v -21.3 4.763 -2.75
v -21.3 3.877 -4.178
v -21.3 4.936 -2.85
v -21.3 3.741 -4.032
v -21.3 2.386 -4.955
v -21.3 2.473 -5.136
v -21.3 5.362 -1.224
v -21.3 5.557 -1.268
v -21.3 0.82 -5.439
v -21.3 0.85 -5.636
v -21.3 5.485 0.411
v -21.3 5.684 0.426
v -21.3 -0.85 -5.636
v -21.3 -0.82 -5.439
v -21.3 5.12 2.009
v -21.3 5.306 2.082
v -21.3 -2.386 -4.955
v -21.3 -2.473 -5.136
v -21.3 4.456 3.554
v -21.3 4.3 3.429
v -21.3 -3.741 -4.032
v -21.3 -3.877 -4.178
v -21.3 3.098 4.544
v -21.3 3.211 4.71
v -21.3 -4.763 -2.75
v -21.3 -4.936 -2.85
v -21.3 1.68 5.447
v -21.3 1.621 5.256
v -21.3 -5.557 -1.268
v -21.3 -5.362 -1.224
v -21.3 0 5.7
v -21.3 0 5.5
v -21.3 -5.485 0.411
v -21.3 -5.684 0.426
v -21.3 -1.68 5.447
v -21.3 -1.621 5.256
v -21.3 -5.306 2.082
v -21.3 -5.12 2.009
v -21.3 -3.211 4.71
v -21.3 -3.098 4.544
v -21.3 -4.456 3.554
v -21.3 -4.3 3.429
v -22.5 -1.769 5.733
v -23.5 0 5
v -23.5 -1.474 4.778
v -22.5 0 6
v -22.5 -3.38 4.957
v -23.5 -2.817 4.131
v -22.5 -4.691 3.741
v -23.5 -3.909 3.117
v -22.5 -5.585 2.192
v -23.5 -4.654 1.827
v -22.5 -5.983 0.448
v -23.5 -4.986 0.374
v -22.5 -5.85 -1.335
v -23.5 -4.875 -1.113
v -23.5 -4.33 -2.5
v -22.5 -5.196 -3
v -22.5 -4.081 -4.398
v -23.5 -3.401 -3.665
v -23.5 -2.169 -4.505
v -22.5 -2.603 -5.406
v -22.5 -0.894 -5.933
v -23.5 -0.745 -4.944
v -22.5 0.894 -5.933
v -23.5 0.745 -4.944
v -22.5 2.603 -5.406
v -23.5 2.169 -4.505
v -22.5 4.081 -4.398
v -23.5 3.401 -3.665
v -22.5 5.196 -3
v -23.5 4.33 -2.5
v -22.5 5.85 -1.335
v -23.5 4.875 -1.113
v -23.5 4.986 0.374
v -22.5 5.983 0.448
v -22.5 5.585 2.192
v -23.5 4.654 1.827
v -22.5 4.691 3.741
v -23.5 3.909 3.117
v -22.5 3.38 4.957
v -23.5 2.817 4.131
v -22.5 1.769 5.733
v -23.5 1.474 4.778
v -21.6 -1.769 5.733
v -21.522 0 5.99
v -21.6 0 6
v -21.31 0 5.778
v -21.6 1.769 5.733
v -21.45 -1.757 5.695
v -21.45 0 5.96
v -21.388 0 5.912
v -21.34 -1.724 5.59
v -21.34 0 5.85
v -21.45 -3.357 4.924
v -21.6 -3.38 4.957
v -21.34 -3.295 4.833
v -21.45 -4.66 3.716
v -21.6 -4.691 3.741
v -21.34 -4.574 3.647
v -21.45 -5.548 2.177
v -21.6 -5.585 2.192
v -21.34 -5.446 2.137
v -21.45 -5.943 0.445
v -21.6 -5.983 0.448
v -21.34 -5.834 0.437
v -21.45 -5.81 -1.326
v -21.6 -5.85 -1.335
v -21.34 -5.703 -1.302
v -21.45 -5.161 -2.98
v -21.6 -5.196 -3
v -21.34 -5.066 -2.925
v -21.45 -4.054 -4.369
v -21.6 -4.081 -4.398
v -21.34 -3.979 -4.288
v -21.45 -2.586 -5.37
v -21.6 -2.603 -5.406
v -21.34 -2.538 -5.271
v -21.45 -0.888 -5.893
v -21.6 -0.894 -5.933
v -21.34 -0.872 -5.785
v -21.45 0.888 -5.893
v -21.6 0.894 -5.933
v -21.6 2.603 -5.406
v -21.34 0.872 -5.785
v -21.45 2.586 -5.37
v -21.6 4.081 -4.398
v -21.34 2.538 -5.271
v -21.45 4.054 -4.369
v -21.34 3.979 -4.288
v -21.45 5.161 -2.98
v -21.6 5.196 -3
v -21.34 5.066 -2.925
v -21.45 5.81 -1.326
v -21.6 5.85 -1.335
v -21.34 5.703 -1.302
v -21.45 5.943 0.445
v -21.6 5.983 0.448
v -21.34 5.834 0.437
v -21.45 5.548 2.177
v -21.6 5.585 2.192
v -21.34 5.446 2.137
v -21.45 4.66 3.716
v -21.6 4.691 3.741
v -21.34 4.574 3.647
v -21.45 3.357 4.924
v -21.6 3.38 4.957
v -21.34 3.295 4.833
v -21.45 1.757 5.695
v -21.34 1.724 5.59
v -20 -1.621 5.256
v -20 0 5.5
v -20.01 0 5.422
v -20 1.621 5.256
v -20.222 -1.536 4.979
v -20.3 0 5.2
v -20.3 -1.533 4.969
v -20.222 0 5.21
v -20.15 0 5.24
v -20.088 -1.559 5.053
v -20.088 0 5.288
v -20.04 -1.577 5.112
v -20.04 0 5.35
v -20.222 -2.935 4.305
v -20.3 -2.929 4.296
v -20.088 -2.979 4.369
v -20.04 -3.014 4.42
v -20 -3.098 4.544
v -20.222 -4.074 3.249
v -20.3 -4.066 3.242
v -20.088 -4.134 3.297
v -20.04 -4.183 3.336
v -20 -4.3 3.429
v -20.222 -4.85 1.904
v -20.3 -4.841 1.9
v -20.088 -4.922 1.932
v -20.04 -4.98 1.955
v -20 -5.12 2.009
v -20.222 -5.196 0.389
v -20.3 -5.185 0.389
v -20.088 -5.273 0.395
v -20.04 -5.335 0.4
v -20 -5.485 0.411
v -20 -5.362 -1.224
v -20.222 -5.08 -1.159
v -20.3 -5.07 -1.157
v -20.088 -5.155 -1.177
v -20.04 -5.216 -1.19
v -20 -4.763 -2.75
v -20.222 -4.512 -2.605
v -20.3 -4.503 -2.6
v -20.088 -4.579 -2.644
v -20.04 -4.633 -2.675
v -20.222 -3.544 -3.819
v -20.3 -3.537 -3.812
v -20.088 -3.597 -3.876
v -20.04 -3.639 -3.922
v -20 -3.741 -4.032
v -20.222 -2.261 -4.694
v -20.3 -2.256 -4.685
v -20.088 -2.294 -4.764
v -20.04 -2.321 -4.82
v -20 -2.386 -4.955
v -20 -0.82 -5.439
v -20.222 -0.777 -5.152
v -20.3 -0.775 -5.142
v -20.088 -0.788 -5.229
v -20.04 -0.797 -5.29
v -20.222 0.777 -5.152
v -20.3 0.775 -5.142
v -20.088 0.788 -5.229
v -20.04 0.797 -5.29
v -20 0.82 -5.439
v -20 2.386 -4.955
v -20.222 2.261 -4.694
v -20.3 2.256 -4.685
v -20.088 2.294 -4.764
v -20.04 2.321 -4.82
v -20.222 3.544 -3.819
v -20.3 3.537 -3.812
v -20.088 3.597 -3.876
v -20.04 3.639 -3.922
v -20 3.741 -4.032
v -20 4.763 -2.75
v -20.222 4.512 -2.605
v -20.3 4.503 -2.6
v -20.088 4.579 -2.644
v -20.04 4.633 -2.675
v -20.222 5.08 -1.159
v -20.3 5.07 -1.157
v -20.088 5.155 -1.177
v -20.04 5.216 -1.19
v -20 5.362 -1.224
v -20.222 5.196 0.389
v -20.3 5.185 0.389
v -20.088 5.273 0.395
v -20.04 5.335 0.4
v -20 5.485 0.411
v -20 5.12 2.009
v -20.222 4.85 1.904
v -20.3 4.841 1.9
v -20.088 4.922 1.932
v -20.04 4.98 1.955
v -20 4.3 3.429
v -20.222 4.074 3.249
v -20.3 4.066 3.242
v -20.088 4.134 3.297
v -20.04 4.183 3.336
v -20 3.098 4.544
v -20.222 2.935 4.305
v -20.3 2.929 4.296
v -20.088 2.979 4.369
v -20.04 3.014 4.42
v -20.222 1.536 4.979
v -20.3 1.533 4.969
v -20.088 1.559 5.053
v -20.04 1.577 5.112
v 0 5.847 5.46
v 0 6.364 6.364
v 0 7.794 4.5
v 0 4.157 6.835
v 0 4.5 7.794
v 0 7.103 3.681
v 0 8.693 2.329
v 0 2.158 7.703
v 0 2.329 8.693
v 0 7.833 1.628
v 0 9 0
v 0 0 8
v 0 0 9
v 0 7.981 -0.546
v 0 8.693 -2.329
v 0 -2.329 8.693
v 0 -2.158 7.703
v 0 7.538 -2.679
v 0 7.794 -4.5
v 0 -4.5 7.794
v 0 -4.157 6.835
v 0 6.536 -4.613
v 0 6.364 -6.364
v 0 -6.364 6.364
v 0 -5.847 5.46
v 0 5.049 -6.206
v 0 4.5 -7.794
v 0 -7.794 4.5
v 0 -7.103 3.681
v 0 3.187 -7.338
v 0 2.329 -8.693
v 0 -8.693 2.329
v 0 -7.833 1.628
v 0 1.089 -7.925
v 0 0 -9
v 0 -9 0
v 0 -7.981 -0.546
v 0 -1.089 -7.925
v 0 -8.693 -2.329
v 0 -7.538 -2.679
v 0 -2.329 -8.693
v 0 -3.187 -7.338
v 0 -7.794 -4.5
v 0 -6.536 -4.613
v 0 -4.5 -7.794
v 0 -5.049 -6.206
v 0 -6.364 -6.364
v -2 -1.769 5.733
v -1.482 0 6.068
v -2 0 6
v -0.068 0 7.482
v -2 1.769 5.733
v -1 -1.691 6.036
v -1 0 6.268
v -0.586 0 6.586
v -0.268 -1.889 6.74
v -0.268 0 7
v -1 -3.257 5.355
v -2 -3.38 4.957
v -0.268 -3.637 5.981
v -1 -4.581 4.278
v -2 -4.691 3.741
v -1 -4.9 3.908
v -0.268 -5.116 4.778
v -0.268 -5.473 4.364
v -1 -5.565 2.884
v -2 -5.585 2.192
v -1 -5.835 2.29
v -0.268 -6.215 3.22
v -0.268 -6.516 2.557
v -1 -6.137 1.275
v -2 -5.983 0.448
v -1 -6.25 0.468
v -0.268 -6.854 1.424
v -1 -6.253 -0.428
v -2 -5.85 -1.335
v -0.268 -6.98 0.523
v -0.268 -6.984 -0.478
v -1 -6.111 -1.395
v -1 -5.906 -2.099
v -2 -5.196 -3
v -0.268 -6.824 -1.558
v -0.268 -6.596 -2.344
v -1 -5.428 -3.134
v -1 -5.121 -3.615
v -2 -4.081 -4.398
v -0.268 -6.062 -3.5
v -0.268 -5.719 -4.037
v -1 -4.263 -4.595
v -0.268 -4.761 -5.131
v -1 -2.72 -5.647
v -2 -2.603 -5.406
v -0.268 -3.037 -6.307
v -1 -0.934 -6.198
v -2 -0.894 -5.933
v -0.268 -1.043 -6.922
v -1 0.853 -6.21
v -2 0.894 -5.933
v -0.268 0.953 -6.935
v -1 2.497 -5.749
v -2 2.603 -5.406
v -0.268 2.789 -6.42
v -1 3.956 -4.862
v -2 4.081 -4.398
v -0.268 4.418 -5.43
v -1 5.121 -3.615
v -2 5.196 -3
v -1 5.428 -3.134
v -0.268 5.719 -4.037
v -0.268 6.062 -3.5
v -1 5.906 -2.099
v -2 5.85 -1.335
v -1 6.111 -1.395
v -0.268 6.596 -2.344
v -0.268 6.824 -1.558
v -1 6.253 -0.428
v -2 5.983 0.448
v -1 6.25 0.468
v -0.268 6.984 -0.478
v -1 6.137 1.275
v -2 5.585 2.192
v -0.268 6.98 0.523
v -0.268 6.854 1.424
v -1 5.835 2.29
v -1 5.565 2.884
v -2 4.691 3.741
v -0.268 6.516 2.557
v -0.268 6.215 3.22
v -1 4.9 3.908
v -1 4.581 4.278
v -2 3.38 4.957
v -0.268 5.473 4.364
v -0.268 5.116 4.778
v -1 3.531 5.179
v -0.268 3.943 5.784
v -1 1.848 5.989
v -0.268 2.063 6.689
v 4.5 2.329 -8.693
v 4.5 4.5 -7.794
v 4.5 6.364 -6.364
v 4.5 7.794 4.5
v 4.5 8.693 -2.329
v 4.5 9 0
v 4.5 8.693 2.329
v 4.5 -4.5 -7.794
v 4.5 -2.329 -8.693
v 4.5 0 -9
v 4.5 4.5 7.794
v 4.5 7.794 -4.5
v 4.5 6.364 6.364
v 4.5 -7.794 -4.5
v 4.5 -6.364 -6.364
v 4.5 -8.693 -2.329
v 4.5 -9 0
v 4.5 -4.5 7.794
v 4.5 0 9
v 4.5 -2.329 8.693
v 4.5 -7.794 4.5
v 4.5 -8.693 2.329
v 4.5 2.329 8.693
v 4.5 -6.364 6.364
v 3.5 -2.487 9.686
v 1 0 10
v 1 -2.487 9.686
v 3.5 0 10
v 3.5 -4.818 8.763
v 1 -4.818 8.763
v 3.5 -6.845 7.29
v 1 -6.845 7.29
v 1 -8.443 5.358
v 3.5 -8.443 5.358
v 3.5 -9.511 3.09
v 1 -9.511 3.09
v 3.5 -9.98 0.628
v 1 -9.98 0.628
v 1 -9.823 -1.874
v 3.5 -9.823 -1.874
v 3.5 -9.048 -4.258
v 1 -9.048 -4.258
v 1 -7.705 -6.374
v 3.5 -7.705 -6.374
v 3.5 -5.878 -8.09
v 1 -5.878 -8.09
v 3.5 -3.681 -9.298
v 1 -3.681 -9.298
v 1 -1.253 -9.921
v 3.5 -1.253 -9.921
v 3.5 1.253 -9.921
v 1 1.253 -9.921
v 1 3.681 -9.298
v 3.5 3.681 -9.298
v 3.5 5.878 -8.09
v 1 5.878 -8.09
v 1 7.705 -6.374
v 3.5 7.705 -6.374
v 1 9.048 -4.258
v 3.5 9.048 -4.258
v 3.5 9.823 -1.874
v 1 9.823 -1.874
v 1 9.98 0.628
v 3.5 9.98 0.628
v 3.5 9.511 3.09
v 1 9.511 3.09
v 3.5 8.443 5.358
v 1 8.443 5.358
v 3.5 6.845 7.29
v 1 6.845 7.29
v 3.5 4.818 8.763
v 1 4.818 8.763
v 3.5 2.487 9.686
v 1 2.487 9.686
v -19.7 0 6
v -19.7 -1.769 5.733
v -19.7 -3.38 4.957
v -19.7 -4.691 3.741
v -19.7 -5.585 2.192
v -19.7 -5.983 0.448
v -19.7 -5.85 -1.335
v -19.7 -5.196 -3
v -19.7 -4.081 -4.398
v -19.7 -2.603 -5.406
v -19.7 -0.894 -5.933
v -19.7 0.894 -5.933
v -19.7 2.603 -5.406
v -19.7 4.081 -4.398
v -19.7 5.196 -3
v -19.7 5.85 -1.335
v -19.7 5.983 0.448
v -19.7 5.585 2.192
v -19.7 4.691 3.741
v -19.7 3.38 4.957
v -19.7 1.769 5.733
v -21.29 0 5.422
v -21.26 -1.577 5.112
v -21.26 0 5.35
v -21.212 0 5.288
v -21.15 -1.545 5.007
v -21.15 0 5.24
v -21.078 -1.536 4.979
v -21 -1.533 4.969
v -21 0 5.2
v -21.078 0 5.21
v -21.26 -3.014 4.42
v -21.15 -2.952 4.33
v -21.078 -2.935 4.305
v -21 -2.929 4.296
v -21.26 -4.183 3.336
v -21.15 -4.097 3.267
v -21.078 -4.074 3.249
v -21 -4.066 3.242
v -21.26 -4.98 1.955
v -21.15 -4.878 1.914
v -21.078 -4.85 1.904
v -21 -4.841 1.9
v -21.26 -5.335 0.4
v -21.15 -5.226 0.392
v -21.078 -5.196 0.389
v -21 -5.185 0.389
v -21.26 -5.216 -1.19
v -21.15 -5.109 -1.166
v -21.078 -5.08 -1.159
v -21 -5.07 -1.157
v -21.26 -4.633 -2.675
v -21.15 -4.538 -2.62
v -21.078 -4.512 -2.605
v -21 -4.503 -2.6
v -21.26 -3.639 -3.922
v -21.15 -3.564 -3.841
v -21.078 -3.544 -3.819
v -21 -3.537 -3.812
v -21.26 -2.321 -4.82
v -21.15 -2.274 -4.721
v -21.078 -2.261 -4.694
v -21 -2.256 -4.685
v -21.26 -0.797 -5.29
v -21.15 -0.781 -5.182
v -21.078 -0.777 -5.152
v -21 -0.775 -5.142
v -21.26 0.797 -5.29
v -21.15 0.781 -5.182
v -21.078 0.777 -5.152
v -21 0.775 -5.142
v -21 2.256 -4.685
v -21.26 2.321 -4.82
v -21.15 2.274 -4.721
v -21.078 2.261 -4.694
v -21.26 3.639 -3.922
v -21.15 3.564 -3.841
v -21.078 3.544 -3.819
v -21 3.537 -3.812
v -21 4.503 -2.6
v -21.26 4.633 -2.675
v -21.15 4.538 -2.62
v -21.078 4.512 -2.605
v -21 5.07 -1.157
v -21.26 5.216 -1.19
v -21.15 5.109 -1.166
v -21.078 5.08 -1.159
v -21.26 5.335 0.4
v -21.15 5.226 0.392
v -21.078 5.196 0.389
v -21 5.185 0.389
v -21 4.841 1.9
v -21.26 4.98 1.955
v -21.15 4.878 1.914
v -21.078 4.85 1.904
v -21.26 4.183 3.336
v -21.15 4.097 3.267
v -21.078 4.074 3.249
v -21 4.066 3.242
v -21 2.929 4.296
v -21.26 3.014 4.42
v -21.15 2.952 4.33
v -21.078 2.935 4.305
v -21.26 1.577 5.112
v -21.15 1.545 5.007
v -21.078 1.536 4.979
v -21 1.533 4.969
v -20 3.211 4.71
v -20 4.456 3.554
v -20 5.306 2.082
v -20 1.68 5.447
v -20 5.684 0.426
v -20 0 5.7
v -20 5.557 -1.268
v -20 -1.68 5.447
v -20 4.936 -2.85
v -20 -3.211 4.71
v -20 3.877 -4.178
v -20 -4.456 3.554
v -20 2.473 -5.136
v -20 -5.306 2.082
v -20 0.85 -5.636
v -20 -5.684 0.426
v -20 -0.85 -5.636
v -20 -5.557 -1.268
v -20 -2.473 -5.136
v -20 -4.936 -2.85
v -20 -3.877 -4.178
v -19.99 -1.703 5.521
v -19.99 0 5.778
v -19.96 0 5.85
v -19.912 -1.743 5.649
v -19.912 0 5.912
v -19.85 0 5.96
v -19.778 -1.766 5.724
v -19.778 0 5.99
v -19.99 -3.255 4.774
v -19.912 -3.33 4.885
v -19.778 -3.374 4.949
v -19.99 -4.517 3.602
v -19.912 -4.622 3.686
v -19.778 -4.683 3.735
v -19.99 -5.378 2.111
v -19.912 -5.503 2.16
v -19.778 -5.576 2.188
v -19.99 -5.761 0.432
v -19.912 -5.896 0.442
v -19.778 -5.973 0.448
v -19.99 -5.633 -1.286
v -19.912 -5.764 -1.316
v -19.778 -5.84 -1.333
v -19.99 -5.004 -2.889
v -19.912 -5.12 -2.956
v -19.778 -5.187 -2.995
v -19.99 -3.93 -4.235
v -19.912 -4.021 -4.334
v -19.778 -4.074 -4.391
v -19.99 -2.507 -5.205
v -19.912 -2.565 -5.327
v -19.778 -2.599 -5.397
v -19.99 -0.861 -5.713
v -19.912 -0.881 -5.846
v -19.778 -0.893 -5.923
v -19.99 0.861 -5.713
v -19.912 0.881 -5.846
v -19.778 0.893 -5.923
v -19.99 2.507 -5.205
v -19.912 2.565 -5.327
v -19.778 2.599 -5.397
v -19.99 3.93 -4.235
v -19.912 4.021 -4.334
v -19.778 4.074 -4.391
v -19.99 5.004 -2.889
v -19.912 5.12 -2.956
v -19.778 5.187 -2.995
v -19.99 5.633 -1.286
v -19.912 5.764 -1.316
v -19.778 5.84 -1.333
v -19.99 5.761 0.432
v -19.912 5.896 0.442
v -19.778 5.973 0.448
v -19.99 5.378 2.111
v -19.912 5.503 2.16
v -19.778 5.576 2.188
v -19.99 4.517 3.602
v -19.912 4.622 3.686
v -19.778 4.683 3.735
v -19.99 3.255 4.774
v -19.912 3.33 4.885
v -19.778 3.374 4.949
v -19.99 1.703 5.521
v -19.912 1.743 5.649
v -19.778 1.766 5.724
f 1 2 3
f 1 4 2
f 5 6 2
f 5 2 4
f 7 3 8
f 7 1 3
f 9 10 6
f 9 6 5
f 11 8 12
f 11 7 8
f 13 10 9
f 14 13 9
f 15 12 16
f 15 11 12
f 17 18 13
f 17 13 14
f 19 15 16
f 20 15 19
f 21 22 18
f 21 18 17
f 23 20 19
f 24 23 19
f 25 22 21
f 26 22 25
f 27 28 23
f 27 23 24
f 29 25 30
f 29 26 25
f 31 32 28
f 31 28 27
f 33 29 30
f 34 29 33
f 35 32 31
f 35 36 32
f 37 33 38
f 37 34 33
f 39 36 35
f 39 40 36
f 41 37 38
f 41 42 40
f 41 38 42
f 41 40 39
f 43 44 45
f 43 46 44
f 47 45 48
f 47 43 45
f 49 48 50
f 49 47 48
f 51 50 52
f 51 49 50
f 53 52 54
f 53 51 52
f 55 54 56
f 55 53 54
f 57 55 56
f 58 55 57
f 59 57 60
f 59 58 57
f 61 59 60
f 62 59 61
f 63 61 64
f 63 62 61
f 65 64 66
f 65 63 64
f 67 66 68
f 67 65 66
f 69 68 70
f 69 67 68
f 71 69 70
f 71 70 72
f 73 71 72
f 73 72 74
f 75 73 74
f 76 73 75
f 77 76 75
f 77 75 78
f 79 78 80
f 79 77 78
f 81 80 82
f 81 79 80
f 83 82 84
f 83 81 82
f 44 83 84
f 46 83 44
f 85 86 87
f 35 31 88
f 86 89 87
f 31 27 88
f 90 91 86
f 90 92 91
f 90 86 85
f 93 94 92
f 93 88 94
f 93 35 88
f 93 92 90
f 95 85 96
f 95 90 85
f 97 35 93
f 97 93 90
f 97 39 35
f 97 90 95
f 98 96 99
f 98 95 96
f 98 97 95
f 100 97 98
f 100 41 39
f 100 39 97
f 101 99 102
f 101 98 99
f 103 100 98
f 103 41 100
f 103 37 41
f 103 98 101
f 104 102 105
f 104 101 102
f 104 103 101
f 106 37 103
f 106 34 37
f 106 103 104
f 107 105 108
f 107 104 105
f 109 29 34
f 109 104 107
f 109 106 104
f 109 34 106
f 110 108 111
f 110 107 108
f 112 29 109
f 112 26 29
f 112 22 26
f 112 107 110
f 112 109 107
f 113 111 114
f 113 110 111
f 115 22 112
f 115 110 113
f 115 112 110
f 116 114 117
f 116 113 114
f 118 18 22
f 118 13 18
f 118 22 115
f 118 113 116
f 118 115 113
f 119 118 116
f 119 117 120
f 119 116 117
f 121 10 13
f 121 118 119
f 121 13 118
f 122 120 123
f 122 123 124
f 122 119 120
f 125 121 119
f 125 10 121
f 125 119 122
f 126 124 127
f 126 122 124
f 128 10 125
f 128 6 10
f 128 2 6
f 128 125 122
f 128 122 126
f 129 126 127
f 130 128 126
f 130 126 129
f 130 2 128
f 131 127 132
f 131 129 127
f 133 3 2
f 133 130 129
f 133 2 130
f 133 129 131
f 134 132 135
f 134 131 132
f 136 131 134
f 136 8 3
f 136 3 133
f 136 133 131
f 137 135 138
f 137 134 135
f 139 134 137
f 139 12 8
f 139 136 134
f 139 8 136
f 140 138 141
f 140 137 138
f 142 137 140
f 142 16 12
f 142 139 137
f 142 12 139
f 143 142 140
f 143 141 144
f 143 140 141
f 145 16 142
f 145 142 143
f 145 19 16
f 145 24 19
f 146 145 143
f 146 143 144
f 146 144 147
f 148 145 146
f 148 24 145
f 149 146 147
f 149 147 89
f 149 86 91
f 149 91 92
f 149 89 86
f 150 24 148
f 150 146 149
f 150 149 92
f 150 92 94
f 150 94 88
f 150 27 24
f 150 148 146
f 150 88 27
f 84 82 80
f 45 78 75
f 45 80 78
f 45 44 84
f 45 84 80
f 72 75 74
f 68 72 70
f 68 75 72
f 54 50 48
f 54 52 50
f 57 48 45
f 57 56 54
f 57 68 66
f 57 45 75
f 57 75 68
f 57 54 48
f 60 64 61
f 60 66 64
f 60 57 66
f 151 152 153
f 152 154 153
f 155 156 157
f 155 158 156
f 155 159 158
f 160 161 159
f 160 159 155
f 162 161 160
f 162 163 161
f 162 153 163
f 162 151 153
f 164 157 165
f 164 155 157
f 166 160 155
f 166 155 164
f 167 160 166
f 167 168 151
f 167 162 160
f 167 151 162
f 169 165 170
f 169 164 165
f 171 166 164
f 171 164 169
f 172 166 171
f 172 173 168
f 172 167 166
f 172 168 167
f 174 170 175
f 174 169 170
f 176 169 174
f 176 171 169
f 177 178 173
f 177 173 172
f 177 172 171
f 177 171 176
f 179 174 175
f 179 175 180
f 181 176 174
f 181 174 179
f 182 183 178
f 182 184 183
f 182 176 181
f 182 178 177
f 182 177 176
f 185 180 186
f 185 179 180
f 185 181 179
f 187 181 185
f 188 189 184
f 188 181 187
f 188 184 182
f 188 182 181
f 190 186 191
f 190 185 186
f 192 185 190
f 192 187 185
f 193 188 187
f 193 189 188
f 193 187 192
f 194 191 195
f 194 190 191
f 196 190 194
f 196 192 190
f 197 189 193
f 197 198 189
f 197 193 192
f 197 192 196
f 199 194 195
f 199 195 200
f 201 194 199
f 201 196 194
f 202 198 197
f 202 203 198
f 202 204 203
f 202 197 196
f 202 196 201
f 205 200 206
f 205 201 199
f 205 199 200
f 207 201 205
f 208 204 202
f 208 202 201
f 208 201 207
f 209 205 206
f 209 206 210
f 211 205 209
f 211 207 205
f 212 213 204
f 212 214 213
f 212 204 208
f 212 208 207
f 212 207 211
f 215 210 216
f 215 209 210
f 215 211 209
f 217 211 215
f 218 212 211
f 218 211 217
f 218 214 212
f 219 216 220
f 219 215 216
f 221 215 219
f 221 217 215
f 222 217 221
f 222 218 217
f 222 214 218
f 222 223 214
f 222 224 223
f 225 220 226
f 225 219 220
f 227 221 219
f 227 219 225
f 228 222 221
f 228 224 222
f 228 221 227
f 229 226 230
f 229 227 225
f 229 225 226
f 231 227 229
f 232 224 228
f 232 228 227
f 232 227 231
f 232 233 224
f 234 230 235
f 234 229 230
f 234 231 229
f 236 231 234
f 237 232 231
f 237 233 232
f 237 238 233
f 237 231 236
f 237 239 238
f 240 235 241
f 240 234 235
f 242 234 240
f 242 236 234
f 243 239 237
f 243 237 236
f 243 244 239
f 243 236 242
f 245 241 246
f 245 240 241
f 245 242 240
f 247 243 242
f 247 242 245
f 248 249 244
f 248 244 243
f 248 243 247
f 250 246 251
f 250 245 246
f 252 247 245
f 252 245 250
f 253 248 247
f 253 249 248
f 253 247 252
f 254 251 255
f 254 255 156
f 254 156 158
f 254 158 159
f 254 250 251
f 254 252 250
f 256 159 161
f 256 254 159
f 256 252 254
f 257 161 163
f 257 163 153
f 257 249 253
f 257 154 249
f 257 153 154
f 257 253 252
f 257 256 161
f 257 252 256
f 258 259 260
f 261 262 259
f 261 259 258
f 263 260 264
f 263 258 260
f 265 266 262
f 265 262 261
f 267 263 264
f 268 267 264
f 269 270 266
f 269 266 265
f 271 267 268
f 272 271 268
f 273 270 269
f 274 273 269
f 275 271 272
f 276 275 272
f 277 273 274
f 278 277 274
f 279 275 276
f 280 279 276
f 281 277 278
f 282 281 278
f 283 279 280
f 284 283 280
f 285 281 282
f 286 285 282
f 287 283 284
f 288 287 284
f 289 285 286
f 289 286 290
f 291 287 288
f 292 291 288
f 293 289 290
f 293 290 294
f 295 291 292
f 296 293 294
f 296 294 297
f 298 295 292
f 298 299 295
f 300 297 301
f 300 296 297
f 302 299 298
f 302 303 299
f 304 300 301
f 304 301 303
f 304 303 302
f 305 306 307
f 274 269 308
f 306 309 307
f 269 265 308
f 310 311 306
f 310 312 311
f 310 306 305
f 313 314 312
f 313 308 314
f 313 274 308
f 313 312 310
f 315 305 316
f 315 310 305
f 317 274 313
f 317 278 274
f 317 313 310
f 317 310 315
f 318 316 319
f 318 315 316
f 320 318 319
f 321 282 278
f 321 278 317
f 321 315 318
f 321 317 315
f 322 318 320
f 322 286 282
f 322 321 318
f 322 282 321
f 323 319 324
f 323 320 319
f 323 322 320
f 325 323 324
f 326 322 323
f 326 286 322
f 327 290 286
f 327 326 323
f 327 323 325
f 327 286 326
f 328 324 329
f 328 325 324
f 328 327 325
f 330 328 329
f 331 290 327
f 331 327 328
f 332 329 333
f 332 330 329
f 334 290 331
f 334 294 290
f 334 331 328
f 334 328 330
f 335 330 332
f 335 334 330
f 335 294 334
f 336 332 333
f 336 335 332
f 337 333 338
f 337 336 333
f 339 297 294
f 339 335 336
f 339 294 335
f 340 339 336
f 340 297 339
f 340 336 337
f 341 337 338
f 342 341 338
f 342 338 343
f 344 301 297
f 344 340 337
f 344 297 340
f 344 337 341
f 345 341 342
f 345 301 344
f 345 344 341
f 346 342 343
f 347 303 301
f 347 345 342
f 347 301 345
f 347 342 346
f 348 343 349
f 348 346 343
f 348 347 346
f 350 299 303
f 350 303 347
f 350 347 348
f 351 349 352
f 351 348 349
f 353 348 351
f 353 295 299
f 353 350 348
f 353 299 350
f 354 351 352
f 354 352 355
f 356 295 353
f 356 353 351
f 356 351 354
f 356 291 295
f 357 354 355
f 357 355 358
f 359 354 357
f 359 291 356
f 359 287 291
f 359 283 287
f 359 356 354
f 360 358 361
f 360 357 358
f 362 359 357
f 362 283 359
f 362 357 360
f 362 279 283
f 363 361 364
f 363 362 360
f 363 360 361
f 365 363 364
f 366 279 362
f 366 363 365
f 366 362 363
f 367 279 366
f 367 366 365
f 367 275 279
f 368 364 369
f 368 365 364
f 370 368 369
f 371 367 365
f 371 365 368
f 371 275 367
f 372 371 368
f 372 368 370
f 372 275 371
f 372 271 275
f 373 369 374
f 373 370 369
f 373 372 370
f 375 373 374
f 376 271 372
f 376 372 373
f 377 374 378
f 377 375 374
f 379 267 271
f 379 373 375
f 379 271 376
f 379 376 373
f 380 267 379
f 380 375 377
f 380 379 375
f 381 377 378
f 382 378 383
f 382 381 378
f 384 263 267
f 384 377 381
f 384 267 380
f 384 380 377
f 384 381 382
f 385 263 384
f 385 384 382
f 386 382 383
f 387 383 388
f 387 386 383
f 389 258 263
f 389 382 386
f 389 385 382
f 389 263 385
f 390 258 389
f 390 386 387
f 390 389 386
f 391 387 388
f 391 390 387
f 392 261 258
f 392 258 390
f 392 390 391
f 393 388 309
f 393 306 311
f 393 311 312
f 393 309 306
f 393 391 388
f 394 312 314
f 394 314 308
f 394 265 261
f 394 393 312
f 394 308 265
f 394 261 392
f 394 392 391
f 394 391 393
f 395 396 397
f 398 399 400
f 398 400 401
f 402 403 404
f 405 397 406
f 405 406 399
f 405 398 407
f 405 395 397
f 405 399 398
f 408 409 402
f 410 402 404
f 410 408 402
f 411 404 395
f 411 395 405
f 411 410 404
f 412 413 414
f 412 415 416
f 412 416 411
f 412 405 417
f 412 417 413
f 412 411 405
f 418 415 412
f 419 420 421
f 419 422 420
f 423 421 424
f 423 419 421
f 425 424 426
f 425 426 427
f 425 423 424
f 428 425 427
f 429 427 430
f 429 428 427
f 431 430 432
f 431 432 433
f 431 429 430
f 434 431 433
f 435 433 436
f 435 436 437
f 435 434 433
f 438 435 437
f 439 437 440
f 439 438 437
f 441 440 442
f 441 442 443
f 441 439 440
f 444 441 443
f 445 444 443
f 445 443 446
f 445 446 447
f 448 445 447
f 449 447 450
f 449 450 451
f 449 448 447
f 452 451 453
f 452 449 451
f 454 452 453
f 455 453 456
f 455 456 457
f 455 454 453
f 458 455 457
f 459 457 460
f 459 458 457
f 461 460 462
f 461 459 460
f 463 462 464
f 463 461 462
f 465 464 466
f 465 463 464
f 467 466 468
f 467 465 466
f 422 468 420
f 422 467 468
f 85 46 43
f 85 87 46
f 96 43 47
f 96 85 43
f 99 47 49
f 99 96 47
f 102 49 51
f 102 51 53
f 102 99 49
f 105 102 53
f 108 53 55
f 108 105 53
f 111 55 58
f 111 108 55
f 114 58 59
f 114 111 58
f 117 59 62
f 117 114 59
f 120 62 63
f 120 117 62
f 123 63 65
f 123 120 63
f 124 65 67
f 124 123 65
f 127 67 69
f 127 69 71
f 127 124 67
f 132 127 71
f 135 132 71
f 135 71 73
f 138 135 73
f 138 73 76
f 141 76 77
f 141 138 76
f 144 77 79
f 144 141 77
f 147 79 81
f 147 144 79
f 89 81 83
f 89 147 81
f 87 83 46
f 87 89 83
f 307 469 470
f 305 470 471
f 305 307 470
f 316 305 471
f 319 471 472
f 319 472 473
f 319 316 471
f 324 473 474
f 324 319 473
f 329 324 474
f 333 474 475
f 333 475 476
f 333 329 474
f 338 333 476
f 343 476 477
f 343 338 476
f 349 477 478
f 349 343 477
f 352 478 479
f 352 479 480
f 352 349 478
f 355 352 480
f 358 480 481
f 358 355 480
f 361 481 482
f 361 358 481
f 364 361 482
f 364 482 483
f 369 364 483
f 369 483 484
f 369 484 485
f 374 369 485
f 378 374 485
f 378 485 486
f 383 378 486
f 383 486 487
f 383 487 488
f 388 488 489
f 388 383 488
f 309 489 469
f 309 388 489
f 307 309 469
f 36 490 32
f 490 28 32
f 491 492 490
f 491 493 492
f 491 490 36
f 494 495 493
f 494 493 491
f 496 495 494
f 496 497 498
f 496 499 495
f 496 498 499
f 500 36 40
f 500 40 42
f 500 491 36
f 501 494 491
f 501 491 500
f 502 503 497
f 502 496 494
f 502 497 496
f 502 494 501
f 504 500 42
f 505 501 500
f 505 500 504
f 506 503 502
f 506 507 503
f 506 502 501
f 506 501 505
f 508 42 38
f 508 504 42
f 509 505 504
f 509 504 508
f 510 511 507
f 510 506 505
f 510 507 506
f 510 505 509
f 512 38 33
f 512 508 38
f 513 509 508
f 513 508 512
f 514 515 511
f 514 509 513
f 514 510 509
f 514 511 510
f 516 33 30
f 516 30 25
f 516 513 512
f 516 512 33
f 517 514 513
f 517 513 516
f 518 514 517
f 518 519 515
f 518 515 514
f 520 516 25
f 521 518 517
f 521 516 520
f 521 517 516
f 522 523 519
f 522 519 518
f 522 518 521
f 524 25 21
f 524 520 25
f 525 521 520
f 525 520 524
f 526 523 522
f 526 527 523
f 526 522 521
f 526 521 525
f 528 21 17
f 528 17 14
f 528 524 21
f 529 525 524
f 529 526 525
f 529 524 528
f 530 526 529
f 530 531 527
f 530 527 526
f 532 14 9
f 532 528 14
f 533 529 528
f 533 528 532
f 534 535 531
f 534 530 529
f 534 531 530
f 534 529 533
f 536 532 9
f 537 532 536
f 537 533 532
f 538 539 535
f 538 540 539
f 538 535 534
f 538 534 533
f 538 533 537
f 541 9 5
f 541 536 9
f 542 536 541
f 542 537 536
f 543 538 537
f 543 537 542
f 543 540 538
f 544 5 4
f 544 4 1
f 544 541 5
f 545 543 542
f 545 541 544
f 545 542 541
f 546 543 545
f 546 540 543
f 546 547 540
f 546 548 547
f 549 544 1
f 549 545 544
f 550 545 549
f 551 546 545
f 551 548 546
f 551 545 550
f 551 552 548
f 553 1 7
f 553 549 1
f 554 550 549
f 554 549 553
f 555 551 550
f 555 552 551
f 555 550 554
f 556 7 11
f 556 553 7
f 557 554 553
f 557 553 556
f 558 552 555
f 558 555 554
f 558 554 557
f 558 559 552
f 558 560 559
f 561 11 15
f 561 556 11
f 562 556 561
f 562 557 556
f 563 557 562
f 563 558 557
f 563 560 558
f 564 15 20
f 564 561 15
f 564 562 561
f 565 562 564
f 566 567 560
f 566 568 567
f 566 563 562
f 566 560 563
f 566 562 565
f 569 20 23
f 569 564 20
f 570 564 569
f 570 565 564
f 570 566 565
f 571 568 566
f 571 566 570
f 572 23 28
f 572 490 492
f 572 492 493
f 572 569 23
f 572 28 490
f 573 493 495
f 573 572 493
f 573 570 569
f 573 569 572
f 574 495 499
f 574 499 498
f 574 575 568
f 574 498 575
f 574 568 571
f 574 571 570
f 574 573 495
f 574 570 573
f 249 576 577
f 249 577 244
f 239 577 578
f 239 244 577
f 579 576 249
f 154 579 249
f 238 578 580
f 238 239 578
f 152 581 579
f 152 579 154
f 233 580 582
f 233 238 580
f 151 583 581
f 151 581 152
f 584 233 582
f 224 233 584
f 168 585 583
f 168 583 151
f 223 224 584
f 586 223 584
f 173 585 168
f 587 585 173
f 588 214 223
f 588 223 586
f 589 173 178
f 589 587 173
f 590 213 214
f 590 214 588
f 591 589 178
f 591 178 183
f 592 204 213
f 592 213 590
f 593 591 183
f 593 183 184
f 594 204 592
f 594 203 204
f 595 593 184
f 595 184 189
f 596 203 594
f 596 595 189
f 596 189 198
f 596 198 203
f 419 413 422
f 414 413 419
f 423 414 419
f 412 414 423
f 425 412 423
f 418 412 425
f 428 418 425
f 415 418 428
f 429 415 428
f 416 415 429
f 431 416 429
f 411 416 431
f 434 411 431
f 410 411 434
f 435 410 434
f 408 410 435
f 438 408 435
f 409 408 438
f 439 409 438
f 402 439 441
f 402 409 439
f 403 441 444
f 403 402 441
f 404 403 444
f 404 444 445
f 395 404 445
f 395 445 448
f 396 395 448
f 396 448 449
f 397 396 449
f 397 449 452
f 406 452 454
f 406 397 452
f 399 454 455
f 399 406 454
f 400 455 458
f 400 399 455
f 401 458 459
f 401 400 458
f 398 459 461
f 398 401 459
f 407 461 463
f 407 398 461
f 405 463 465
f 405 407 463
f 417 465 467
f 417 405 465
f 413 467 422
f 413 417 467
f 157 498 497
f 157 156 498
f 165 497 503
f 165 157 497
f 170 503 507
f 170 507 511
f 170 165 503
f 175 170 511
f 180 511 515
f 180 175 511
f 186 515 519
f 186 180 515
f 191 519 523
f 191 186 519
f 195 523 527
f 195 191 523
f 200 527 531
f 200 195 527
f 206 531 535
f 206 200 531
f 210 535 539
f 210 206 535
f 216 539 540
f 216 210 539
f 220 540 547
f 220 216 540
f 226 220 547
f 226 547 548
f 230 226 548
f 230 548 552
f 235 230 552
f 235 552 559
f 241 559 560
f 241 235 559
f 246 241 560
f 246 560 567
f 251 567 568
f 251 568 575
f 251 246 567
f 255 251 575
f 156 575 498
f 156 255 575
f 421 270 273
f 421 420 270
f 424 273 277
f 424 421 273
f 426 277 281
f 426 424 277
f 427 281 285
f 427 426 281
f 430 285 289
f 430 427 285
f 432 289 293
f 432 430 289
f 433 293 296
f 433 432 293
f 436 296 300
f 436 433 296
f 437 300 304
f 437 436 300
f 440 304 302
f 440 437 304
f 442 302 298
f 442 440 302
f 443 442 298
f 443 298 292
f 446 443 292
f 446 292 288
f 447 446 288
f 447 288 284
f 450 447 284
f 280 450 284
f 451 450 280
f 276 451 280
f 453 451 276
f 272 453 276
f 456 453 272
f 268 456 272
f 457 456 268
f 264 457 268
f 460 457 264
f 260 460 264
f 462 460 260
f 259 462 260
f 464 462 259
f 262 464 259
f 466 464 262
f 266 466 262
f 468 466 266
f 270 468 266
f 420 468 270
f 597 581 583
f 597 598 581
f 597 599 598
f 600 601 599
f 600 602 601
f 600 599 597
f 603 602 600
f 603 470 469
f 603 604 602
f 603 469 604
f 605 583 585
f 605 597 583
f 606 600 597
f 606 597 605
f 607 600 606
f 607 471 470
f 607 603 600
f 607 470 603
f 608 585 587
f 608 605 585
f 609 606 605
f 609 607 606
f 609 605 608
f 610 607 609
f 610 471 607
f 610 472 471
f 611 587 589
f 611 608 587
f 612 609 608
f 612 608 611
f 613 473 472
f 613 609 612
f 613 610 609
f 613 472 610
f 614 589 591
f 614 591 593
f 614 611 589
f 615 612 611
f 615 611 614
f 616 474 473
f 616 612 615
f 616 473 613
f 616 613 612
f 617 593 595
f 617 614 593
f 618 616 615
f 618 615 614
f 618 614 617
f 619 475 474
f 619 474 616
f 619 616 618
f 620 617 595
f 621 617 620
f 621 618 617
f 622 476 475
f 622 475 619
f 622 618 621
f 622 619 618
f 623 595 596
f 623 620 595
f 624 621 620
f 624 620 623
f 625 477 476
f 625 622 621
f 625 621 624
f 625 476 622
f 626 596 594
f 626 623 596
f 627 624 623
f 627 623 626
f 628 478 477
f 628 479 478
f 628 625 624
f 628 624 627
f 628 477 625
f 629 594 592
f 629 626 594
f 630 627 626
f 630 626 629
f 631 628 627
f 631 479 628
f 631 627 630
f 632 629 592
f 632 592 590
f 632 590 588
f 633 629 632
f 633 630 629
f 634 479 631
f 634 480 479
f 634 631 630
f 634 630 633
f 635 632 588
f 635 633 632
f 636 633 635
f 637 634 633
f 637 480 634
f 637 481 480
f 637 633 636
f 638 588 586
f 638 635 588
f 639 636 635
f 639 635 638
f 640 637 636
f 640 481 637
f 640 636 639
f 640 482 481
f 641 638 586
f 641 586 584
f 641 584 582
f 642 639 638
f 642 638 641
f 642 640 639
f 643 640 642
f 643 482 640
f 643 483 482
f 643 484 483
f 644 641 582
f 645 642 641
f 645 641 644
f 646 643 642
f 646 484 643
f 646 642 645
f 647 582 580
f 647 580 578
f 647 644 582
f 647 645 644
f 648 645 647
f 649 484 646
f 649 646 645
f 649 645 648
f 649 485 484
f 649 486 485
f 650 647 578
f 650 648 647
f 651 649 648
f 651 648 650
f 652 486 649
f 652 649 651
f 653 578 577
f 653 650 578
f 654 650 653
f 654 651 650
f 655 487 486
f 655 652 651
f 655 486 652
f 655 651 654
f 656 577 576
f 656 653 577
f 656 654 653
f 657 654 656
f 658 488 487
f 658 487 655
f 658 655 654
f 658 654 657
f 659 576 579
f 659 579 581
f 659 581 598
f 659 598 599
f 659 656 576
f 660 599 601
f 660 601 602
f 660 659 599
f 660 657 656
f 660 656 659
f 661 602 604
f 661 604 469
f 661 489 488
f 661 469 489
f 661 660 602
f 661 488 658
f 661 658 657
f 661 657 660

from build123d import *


with BuildPart() as part:
    # Sketch1 → Revolve1 (revolve)
    with BuildSketch(Plane(origin=(0, 0, 0), x_dir=(-1, 0, 0), z_dir=(0, 1, 0))):
        with BuildLine():
            Line((-1, 10), (-3.5, 10))
            Line((-3.5, 10), (-4.5, 9))
            Line((-4.5, 9), (-4.5, 0))
            Line((-4.5, 0), (23.5, 0))
            Line((23.5, 0), (23.5, 5))
            Line((23.5, 5), (22.5, 6))
            Line((22.5, 6), (21.6, 6))
            ThreePointArc((21.6, 6), (21.387867966, 5.912132034), (21.3, 5.7))
            Line((21.3, 5.7), (21.3, 5.5))
            ThreePointArc((21.3, 5.5), (21.212132034, 5.287867966), (21, 5.2))
            Line((21, 5.2), (20.3, 5.2))
            ThreePointArc((20.3, 5.2), (20.087867966, 5.287867966), (20, 5.5))
            Line((20, 5.5), (20, 5.7))
            ThreePointArc((20, 5.7), (19.912132034, 5.912132034), (19.7, 6))
            Line((19.7, 6), (2, 6))
            ThreePointArc((2, 6), (0.585786438, 6.585786438), (0, 8))
            Line((0, 8), (0, 9))
            Line((0, 9), (-1, 10))
        make_face()
    revolve(axis=Axis((-23.5, 0, 0), (1, 0, 0)))


solid = part.part
